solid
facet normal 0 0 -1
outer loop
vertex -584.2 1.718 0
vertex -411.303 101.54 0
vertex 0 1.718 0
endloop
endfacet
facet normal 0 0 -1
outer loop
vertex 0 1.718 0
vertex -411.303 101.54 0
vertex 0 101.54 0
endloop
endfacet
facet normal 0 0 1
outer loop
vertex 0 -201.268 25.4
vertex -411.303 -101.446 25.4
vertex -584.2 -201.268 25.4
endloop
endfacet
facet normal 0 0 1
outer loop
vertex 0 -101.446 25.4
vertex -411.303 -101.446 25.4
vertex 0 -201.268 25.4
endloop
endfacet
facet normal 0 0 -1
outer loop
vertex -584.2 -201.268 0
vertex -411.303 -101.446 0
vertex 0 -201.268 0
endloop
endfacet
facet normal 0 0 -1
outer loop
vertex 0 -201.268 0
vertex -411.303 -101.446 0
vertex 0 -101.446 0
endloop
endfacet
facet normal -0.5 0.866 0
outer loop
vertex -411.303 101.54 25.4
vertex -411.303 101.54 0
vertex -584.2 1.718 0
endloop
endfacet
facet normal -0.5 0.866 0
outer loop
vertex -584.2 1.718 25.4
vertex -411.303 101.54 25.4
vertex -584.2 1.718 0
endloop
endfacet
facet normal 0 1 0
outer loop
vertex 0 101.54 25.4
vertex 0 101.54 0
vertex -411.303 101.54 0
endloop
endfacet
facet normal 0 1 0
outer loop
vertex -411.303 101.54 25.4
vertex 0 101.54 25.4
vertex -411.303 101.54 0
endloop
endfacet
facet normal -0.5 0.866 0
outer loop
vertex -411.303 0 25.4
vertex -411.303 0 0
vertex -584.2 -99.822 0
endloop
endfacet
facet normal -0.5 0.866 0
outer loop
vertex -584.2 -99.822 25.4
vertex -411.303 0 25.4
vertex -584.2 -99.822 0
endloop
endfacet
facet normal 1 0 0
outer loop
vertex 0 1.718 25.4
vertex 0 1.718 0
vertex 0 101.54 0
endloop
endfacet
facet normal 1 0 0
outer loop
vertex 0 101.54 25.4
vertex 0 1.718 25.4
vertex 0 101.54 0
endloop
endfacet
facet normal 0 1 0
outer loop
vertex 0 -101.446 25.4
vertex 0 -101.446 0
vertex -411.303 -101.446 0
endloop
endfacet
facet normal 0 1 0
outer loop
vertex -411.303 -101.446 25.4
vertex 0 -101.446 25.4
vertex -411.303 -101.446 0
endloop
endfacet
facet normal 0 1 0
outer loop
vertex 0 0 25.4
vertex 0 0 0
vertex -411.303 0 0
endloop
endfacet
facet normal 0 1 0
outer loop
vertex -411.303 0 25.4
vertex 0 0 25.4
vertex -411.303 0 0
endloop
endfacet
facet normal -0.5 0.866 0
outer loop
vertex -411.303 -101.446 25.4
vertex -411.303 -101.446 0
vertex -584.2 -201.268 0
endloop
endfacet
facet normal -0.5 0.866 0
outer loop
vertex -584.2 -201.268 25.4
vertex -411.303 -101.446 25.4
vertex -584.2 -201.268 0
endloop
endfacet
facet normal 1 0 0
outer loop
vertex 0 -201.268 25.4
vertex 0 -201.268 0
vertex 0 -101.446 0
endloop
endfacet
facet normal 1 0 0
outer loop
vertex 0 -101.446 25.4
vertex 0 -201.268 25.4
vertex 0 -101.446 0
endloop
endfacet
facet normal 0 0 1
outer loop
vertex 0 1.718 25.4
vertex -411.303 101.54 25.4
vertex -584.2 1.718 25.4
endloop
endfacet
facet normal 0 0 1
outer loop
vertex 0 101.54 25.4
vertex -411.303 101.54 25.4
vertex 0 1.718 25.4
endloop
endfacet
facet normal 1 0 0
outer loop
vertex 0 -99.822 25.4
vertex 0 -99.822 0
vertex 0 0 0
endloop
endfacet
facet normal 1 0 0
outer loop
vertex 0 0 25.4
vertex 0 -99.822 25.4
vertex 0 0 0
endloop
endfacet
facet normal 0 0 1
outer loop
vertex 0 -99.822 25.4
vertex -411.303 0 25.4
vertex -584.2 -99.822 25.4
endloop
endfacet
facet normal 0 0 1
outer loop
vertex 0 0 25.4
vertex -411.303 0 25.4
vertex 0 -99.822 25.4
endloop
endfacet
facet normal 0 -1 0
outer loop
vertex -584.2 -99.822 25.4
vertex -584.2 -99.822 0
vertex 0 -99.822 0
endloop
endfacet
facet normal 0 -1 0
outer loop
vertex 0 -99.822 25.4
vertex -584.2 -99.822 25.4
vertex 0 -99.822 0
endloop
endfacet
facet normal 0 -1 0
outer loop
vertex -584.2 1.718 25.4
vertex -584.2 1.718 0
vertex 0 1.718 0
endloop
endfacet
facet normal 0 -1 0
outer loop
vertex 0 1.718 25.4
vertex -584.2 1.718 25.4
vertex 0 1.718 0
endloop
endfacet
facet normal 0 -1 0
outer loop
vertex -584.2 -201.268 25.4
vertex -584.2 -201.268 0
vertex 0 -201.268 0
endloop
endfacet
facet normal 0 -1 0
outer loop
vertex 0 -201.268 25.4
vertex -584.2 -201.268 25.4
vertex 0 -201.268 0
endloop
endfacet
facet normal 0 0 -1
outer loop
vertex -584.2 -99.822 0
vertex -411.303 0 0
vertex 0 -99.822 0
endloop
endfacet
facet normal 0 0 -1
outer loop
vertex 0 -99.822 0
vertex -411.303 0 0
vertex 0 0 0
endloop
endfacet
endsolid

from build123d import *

# Parameters (mm, degrees)
BOSS_EXTRUDE1_DEPTH   = 25.4
BOSS_EXTRUDE1_2_DEPTH = 25.4
BOSS_EXTRUDE1_3_DEPTH = 25.4


with BuildPart() as part:
    # Sketch1 → Boss-Extrude1 (new body)
    with BuildSketch(Plane.XY):
        Polygon((0, 0), (-411.303224287, 0), (-584.2, -99.822), (0, -99.822), align=None)
    extrude(amount=BOSS_EXTRUDE1_DEPTH)


with BuildPart() as body_2:
    # Sketch1 → Boss-Extrude1 2 (new body)
    with BuildSketch(Plane.XY):
        Polygon((0, 101.539691072), (-411.303224287, 101.539691072), (-584.2, 1.717691072), (0, 1.717691072), align=None)
    extrude(amount=BOSS_EXTRUDE1_2_DEPTH)


with BuildPart() as body_3:
    # Sketch1 → Boss-Extrude1 3 (new body)
    with BuildSketch(Plane.XY):
        Polygon((0, -101.445836193), (-411.303224287, -101.445836193), (-584.2, -201.267836193), (0, -201.267836193), align=None)
    extrude(amount=BOSS_EXTRUDE1_3_DEPTH)


solid = Compound([part.part, body_2.part, body_3.part])
